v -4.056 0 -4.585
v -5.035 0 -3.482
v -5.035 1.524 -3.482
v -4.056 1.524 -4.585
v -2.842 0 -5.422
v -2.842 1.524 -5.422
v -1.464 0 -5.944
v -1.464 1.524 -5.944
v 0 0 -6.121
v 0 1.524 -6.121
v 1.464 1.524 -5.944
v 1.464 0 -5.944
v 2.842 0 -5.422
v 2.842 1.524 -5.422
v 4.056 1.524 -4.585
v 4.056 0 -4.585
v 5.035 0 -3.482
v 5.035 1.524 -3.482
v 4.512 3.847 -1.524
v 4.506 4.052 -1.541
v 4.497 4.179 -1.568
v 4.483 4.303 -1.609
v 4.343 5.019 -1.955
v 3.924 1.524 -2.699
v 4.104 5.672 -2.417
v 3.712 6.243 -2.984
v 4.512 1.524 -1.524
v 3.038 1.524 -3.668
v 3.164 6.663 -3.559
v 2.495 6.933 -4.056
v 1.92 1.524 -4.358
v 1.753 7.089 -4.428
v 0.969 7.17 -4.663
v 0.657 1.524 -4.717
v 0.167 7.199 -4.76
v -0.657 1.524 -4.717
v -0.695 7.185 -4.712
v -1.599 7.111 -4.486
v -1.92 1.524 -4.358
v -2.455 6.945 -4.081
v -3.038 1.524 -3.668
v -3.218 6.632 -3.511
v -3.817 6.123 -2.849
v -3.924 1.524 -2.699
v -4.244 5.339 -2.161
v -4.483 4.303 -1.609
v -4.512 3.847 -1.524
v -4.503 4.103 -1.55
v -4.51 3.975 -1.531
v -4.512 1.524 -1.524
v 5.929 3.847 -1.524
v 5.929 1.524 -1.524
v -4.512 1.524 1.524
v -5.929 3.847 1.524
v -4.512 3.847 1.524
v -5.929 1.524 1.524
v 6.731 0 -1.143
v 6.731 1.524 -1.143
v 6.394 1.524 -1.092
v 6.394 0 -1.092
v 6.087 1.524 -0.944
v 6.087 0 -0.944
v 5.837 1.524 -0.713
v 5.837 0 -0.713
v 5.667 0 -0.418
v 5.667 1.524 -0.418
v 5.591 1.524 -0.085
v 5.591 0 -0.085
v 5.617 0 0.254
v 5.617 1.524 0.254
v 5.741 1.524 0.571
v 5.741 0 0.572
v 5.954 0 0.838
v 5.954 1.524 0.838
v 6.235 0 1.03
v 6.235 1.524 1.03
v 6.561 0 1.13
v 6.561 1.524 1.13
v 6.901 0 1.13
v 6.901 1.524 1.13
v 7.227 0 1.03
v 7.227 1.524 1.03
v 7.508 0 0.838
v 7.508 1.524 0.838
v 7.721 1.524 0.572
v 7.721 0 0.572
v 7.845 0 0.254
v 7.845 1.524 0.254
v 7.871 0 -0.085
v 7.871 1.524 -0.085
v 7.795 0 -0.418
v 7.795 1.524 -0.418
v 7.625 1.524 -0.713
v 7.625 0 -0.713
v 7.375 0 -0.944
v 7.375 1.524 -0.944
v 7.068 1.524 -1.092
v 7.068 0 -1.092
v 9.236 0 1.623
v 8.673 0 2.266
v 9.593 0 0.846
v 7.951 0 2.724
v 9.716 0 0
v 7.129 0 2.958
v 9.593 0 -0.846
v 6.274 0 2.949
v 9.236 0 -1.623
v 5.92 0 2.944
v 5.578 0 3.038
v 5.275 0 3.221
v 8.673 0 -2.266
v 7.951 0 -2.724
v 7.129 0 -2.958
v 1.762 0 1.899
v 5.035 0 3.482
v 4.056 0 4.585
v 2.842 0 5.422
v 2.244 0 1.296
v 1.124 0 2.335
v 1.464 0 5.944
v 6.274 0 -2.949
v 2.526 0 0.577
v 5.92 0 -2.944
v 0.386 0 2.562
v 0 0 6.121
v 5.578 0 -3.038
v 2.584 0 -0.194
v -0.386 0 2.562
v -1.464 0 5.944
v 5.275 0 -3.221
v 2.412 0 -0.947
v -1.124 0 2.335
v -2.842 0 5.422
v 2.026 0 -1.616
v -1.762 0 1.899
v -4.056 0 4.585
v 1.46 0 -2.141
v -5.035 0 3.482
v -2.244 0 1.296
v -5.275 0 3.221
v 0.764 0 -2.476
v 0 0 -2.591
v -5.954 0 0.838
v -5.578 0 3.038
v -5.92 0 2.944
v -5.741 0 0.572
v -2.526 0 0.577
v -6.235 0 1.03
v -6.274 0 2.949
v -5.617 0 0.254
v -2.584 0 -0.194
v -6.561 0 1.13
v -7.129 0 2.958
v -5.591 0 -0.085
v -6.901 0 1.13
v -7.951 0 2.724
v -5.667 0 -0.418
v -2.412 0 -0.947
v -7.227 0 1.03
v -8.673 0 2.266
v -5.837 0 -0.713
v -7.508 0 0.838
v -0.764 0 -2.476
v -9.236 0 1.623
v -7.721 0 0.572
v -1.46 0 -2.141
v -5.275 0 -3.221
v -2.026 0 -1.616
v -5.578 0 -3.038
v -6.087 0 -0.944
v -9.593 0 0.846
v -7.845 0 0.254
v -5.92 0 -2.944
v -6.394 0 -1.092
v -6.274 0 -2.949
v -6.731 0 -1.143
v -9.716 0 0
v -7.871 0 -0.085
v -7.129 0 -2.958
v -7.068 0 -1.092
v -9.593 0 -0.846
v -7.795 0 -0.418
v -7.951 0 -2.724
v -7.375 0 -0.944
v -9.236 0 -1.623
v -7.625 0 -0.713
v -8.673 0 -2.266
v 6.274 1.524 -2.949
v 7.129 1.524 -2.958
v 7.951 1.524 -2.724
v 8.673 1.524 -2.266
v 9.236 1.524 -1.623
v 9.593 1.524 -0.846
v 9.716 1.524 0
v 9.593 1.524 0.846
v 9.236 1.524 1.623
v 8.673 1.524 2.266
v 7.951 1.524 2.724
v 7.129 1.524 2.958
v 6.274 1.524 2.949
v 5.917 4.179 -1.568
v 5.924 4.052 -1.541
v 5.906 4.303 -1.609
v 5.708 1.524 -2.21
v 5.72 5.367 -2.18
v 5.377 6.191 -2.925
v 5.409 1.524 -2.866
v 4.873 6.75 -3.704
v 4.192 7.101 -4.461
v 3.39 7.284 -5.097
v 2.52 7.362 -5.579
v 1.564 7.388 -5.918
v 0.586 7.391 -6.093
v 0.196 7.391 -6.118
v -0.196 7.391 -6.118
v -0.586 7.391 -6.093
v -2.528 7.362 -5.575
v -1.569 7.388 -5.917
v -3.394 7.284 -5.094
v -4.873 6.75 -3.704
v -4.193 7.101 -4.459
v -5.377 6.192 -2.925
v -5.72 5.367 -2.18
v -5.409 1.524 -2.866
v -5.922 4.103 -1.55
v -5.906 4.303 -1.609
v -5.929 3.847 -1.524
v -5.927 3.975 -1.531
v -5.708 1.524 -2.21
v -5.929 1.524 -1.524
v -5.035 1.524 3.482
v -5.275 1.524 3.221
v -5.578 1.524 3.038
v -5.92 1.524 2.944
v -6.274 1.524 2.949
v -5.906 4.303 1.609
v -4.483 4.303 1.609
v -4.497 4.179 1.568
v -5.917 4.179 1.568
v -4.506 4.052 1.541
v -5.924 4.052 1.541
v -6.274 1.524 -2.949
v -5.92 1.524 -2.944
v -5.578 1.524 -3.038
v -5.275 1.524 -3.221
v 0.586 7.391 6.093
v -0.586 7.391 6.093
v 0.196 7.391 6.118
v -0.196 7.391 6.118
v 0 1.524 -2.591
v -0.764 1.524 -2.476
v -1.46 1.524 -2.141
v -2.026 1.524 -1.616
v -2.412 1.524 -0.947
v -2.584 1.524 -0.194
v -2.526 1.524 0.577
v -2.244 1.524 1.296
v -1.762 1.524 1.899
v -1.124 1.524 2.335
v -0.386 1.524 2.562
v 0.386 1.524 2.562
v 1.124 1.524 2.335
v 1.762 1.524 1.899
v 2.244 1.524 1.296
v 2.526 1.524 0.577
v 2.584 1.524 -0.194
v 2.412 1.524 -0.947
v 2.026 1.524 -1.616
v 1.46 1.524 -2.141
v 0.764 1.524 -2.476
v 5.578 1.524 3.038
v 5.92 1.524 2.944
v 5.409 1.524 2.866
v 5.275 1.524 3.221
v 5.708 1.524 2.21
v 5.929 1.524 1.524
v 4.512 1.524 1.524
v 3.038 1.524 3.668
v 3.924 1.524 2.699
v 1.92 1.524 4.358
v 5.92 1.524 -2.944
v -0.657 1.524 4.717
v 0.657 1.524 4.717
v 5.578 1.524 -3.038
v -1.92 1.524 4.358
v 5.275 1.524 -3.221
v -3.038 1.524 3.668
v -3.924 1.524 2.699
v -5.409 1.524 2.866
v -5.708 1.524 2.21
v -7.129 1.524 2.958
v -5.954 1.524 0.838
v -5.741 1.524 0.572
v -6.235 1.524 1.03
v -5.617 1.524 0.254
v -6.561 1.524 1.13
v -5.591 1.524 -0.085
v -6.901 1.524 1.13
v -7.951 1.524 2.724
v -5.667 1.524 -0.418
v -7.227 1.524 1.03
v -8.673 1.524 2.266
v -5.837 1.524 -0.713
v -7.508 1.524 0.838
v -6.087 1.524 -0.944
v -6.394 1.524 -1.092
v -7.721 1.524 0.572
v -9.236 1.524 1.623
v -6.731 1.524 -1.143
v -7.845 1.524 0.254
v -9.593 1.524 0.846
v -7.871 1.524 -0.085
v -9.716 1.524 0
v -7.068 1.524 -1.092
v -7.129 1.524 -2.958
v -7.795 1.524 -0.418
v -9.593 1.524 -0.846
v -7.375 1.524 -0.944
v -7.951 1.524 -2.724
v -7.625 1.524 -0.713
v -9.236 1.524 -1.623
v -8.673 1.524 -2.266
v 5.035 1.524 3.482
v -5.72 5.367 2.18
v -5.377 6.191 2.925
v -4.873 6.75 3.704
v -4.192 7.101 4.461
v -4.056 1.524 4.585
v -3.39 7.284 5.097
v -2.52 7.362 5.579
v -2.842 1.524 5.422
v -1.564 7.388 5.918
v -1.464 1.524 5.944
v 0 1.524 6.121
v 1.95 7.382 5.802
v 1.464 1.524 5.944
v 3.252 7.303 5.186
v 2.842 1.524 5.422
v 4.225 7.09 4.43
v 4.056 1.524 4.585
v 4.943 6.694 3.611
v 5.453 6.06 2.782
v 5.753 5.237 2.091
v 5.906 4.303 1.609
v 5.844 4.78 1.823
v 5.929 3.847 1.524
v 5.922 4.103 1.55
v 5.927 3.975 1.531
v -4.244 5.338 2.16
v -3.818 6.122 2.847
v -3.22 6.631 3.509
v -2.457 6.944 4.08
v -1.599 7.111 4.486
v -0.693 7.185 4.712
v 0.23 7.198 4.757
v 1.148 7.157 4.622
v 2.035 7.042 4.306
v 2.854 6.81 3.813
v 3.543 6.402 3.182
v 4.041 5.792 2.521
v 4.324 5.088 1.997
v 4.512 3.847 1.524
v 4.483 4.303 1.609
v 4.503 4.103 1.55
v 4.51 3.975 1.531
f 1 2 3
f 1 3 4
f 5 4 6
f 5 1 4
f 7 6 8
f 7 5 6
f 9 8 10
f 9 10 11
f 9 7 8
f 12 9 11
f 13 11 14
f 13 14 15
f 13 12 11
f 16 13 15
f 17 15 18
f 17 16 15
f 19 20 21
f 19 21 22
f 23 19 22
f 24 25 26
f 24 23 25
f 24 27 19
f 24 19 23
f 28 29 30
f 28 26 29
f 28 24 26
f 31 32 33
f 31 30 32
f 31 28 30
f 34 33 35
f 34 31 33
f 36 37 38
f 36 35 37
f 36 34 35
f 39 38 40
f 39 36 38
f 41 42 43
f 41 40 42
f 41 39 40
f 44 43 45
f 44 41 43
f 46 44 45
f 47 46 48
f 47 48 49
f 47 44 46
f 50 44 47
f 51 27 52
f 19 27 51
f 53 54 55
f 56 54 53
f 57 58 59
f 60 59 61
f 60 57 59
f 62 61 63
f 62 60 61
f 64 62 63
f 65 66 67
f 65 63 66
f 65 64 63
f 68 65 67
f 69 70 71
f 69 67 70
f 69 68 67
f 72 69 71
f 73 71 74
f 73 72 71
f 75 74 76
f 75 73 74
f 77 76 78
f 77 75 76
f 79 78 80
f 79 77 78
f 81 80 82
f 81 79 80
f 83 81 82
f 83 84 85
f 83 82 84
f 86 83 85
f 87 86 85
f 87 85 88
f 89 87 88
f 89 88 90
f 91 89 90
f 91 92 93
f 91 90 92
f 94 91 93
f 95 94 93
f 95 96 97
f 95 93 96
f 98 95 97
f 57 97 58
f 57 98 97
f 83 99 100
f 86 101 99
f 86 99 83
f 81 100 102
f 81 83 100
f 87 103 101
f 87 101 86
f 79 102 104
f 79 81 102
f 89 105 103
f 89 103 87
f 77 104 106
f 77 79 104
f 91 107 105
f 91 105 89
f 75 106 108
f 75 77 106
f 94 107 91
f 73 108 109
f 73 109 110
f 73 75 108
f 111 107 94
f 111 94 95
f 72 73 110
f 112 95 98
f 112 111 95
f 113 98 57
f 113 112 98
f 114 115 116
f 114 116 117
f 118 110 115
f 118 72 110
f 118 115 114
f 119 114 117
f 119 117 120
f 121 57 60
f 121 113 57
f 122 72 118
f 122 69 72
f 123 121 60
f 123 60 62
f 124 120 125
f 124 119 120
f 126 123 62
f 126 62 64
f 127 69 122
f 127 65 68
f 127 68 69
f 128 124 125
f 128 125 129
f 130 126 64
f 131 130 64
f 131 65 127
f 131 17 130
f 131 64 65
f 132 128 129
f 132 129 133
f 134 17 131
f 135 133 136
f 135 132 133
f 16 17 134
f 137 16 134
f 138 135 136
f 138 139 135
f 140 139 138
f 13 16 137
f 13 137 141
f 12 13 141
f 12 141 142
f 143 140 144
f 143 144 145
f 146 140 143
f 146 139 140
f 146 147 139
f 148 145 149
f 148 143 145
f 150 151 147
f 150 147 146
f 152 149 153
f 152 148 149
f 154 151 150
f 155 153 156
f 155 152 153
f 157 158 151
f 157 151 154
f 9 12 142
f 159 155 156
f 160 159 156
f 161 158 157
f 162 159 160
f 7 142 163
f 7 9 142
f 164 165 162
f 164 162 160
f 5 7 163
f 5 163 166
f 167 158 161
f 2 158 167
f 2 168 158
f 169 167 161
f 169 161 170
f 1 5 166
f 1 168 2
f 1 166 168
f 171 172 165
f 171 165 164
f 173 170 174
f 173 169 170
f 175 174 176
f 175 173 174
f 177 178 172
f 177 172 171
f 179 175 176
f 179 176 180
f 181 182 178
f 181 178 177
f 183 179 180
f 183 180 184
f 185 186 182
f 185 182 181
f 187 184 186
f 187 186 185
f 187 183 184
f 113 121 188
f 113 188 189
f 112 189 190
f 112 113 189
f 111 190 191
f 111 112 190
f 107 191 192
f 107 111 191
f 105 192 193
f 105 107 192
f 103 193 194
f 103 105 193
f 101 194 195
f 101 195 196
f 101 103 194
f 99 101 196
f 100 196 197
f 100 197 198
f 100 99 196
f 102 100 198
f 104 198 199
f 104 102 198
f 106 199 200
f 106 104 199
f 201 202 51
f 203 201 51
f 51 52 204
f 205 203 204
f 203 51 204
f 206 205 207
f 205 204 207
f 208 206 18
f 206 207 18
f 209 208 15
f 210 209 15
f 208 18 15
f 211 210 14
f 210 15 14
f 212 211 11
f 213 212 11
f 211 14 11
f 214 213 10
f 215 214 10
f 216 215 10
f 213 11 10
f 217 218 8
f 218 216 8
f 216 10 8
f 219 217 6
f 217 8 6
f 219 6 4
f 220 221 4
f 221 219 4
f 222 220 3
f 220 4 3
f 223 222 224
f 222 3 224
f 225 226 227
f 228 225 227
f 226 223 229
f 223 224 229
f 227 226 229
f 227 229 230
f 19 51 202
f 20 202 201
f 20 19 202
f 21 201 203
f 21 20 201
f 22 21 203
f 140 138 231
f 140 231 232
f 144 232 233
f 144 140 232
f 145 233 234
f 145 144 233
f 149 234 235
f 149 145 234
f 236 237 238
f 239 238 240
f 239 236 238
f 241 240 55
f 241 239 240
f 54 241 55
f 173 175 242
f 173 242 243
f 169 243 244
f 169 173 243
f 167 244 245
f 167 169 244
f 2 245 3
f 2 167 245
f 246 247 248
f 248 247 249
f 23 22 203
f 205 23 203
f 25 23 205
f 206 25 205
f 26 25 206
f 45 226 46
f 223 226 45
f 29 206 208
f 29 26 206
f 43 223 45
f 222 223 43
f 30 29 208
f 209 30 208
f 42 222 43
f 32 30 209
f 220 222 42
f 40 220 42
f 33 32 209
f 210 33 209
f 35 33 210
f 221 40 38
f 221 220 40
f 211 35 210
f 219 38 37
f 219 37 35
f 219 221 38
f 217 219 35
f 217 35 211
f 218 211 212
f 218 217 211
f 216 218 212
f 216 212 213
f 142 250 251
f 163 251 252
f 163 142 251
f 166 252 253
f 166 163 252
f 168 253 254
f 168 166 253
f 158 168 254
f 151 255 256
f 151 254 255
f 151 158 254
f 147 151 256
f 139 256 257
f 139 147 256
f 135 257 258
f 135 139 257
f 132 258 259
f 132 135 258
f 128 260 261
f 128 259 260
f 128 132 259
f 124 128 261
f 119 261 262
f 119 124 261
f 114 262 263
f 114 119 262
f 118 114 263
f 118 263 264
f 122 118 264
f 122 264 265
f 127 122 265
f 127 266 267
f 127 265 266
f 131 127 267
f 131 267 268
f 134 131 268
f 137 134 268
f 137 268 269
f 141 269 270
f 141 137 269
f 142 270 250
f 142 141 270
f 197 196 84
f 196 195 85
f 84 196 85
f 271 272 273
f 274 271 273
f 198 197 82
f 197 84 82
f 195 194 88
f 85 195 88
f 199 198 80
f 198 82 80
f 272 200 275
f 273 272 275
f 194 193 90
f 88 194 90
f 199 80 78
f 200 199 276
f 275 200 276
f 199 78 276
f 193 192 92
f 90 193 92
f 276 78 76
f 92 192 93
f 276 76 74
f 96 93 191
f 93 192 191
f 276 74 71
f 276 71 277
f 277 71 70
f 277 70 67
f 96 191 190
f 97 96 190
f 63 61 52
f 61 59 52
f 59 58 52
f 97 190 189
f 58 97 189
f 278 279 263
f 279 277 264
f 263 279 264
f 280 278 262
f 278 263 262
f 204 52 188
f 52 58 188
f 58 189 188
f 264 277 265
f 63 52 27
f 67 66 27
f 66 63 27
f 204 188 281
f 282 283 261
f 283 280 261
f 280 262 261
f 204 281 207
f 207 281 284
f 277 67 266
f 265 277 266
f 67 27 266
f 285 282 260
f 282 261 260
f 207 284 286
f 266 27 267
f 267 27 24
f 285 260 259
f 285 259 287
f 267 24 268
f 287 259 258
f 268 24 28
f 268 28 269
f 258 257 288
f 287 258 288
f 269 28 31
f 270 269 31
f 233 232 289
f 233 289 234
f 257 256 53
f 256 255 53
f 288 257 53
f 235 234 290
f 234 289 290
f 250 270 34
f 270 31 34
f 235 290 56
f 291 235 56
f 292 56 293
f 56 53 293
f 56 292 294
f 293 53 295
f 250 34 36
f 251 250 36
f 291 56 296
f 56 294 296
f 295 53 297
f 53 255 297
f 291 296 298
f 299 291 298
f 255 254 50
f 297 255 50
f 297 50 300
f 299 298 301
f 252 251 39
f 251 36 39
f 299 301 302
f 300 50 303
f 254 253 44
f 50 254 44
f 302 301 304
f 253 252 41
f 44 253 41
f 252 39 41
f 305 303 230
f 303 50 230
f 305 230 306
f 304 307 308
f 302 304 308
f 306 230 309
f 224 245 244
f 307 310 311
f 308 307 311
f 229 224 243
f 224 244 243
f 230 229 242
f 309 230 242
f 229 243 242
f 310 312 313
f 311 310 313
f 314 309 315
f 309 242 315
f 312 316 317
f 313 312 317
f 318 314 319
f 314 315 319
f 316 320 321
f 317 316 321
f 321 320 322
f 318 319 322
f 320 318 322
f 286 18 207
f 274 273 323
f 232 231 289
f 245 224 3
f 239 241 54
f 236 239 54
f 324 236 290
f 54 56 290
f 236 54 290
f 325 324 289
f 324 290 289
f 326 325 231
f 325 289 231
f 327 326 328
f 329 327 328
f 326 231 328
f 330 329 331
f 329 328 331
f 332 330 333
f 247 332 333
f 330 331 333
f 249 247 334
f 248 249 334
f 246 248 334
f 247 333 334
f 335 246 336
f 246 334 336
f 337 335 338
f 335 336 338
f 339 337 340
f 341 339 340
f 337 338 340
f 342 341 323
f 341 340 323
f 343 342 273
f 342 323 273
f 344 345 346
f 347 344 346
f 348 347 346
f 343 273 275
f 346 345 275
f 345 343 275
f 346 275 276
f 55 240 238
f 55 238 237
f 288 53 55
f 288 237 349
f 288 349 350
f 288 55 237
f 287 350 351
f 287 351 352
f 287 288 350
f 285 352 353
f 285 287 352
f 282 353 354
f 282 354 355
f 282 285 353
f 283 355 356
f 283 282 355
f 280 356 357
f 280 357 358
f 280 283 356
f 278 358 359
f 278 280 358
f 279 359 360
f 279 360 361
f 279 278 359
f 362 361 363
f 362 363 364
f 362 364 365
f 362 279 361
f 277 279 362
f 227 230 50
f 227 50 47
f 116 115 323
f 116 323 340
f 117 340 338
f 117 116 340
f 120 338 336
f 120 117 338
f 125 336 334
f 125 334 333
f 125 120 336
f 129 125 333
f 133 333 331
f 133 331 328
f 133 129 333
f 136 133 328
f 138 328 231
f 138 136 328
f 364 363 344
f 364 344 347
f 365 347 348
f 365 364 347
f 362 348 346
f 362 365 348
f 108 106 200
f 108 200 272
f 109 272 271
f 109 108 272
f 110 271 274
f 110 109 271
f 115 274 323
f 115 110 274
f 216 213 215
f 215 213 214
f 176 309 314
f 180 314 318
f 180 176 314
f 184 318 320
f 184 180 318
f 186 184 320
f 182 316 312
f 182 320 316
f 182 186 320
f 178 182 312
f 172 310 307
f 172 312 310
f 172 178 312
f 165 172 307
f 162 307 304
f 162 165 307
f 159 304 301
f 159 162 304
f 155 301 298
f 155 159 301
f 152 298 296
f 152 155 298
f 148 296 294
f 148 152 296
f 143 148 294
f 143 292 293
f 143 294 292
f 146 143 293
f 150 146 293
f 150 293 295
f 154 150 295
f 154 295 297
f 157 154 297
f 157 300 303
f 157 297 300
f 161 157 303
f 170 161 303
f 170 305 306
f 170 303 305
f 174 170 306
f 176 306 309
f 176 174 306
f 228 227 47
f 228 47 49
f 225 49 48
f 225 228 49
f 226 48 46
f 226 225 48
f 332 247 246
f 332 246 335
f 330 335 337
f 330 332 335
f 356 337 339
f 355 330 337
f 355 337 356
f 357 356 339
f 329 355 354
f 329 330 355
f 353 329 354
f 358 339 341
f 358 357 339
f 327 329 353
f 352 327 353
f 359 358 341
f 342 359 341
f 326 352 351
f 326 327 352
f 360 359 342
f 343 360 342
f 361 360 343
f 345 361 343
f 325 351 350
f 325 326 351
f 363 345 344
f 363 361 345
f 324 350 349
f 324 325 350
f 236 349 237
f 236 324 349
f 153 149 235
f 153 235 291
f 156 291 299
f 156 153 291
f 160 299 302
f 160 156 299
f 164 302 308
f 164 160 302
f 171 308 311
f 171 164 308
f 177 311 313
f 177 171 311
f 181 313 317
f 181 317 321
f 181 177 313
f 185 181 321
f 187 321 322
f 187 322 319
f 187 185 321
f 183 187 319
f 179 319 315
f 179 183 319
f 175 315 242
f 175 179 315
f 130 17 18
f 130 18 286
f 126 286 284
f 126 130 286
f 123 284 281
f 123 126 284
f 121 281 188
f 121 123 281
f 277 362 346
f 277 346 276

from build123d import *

# Parameters (mm, degrees)
SKETCH1_R               = 2.591205892
SKETCH1_R_2             = 1.143
BOSS_EXTRUDE4_DEPTH     = 1.524
SKETCH5_R               = 6.1214
SKETCH5_R_2             = 4.7625
BOSS_EXTRUDE6_DEPTH     = 5.8674
CUT_EXTRUDE1_DEPTH      = 14.656327184
CUT_EXTRUDE1_DEPTH_BACK = 14.656327184


with BuildPart() as part:
    # Sketch1 → Boss-Extrude4 (new body)
    with BuildSketch(Plane(origin=(0, 0, 0), x_dir=(1, 0, 0), z_dir=(0, 1, 0))):
        with BuildLine():
            ThreePointArc((6.273777289, -2.949269001), (9.7155, 0), (6.273777289, 2.949269001))
            ThreePointArc((6.273777289, 2.949269001), (5.577680109, 3.037502335), (5.034675871, 3.481892708))
            ThreePointArc((5.034675871, 3.481892708), (0, 6.1214), (-5.034675871, 3.481892708))
            ThreePointArc((-5.034675871, 3.481892708), (-5.577680109, 3.037502335), (-6.273777289, 2.949269001))
            ThreePointArc((-6.273777289, 2.949269001), (-9.7155, 0), (-6.273777289, -2.949269001))
            ThreePointArc((-6.273777289, -2.949269001), (-5.577680109, -3.037502335), (-5.034675871, -3.481892708))
            ThreePointArc((-5.034675871, -3.481892708), (0, -6.1214), (5.034675871, -3.481892708))
            ThreePointArc((5.034675871, -3.481892708), (5.577680109, -3.037502335), (6.273777289, -2.949269001))
        make_face()
        Circle(SKETCH1_R, mode=Mode.SUBTRACT)
        with Locations((6.731, 0)):
            Circle(SKETCH1_R_2, mode=Mode.SUBTRACT)
        with Locations((-6.731, 0)):
            Circle(SKETCH1_R_2, mode=Mode.SUBTRACT)
    extrude(amount=BOSS_EXTRUDE4_DEPTH)

    # Sketch5 → Boss-Extrude6 (add)
    with BuildSketch(Plane(origin=(0, 1.524, 0), x_dir=(1, 0, 0), z_dir=(0, 1, 0))):
        Circle(SKETCH5_R)
        Circle(SKETCH5_R_2, mode=Mode.SUBTRACT)
    extrude(amount=BOSS_EXTRUDE6_DEPTH)

    # Sketch6 → Cut-Extrude1 (cut, two sides: drawn at the far end of the back side and taken through both)
    with BuildSketch(Plane(origin=(0, 0, 0), x_dir=(0, 0, -1), z_dir=(1, 0, 0)).offset(-CUT_EXTRUDE1_DEPTH_BACK)):
        with BuildLine():
            Line((-1.524, 3.846535004), (-1.524, 1.524))
            Line((-1.524, 1.524), (1.524, 1.524))
            Line((1.524, 1.524), (1.524, 3.846535004))
            ThreePointArc((1.524, 3.846535004), (1.545376148, 4.078566202), (1.608785003, 4.302786482))
            ThreePointArc((1.608785003, 4.302786482), (3.384739438, 6.548912496), (6.1214, 7.3914))
            Line((6.1214, 7.3914), (-6.1214, 7.3914))
            ThreePointArc((-6.1214, 7.3914), (-3.384739438, 6.548912496), (-1.608785003, 4.302786482))
            ThreePointArc((-1.608785003, 4.302786482), (-1.545376148, 4.078566202), (-1.524, 3.846535004))
        make_face()
    extrude(amount=CUT_EXTRUDE1_DEPTH + CUT_EXTRUDE1_DEPTH_BACK, mode=Mode.SUBTRACT)


solid = part.part
